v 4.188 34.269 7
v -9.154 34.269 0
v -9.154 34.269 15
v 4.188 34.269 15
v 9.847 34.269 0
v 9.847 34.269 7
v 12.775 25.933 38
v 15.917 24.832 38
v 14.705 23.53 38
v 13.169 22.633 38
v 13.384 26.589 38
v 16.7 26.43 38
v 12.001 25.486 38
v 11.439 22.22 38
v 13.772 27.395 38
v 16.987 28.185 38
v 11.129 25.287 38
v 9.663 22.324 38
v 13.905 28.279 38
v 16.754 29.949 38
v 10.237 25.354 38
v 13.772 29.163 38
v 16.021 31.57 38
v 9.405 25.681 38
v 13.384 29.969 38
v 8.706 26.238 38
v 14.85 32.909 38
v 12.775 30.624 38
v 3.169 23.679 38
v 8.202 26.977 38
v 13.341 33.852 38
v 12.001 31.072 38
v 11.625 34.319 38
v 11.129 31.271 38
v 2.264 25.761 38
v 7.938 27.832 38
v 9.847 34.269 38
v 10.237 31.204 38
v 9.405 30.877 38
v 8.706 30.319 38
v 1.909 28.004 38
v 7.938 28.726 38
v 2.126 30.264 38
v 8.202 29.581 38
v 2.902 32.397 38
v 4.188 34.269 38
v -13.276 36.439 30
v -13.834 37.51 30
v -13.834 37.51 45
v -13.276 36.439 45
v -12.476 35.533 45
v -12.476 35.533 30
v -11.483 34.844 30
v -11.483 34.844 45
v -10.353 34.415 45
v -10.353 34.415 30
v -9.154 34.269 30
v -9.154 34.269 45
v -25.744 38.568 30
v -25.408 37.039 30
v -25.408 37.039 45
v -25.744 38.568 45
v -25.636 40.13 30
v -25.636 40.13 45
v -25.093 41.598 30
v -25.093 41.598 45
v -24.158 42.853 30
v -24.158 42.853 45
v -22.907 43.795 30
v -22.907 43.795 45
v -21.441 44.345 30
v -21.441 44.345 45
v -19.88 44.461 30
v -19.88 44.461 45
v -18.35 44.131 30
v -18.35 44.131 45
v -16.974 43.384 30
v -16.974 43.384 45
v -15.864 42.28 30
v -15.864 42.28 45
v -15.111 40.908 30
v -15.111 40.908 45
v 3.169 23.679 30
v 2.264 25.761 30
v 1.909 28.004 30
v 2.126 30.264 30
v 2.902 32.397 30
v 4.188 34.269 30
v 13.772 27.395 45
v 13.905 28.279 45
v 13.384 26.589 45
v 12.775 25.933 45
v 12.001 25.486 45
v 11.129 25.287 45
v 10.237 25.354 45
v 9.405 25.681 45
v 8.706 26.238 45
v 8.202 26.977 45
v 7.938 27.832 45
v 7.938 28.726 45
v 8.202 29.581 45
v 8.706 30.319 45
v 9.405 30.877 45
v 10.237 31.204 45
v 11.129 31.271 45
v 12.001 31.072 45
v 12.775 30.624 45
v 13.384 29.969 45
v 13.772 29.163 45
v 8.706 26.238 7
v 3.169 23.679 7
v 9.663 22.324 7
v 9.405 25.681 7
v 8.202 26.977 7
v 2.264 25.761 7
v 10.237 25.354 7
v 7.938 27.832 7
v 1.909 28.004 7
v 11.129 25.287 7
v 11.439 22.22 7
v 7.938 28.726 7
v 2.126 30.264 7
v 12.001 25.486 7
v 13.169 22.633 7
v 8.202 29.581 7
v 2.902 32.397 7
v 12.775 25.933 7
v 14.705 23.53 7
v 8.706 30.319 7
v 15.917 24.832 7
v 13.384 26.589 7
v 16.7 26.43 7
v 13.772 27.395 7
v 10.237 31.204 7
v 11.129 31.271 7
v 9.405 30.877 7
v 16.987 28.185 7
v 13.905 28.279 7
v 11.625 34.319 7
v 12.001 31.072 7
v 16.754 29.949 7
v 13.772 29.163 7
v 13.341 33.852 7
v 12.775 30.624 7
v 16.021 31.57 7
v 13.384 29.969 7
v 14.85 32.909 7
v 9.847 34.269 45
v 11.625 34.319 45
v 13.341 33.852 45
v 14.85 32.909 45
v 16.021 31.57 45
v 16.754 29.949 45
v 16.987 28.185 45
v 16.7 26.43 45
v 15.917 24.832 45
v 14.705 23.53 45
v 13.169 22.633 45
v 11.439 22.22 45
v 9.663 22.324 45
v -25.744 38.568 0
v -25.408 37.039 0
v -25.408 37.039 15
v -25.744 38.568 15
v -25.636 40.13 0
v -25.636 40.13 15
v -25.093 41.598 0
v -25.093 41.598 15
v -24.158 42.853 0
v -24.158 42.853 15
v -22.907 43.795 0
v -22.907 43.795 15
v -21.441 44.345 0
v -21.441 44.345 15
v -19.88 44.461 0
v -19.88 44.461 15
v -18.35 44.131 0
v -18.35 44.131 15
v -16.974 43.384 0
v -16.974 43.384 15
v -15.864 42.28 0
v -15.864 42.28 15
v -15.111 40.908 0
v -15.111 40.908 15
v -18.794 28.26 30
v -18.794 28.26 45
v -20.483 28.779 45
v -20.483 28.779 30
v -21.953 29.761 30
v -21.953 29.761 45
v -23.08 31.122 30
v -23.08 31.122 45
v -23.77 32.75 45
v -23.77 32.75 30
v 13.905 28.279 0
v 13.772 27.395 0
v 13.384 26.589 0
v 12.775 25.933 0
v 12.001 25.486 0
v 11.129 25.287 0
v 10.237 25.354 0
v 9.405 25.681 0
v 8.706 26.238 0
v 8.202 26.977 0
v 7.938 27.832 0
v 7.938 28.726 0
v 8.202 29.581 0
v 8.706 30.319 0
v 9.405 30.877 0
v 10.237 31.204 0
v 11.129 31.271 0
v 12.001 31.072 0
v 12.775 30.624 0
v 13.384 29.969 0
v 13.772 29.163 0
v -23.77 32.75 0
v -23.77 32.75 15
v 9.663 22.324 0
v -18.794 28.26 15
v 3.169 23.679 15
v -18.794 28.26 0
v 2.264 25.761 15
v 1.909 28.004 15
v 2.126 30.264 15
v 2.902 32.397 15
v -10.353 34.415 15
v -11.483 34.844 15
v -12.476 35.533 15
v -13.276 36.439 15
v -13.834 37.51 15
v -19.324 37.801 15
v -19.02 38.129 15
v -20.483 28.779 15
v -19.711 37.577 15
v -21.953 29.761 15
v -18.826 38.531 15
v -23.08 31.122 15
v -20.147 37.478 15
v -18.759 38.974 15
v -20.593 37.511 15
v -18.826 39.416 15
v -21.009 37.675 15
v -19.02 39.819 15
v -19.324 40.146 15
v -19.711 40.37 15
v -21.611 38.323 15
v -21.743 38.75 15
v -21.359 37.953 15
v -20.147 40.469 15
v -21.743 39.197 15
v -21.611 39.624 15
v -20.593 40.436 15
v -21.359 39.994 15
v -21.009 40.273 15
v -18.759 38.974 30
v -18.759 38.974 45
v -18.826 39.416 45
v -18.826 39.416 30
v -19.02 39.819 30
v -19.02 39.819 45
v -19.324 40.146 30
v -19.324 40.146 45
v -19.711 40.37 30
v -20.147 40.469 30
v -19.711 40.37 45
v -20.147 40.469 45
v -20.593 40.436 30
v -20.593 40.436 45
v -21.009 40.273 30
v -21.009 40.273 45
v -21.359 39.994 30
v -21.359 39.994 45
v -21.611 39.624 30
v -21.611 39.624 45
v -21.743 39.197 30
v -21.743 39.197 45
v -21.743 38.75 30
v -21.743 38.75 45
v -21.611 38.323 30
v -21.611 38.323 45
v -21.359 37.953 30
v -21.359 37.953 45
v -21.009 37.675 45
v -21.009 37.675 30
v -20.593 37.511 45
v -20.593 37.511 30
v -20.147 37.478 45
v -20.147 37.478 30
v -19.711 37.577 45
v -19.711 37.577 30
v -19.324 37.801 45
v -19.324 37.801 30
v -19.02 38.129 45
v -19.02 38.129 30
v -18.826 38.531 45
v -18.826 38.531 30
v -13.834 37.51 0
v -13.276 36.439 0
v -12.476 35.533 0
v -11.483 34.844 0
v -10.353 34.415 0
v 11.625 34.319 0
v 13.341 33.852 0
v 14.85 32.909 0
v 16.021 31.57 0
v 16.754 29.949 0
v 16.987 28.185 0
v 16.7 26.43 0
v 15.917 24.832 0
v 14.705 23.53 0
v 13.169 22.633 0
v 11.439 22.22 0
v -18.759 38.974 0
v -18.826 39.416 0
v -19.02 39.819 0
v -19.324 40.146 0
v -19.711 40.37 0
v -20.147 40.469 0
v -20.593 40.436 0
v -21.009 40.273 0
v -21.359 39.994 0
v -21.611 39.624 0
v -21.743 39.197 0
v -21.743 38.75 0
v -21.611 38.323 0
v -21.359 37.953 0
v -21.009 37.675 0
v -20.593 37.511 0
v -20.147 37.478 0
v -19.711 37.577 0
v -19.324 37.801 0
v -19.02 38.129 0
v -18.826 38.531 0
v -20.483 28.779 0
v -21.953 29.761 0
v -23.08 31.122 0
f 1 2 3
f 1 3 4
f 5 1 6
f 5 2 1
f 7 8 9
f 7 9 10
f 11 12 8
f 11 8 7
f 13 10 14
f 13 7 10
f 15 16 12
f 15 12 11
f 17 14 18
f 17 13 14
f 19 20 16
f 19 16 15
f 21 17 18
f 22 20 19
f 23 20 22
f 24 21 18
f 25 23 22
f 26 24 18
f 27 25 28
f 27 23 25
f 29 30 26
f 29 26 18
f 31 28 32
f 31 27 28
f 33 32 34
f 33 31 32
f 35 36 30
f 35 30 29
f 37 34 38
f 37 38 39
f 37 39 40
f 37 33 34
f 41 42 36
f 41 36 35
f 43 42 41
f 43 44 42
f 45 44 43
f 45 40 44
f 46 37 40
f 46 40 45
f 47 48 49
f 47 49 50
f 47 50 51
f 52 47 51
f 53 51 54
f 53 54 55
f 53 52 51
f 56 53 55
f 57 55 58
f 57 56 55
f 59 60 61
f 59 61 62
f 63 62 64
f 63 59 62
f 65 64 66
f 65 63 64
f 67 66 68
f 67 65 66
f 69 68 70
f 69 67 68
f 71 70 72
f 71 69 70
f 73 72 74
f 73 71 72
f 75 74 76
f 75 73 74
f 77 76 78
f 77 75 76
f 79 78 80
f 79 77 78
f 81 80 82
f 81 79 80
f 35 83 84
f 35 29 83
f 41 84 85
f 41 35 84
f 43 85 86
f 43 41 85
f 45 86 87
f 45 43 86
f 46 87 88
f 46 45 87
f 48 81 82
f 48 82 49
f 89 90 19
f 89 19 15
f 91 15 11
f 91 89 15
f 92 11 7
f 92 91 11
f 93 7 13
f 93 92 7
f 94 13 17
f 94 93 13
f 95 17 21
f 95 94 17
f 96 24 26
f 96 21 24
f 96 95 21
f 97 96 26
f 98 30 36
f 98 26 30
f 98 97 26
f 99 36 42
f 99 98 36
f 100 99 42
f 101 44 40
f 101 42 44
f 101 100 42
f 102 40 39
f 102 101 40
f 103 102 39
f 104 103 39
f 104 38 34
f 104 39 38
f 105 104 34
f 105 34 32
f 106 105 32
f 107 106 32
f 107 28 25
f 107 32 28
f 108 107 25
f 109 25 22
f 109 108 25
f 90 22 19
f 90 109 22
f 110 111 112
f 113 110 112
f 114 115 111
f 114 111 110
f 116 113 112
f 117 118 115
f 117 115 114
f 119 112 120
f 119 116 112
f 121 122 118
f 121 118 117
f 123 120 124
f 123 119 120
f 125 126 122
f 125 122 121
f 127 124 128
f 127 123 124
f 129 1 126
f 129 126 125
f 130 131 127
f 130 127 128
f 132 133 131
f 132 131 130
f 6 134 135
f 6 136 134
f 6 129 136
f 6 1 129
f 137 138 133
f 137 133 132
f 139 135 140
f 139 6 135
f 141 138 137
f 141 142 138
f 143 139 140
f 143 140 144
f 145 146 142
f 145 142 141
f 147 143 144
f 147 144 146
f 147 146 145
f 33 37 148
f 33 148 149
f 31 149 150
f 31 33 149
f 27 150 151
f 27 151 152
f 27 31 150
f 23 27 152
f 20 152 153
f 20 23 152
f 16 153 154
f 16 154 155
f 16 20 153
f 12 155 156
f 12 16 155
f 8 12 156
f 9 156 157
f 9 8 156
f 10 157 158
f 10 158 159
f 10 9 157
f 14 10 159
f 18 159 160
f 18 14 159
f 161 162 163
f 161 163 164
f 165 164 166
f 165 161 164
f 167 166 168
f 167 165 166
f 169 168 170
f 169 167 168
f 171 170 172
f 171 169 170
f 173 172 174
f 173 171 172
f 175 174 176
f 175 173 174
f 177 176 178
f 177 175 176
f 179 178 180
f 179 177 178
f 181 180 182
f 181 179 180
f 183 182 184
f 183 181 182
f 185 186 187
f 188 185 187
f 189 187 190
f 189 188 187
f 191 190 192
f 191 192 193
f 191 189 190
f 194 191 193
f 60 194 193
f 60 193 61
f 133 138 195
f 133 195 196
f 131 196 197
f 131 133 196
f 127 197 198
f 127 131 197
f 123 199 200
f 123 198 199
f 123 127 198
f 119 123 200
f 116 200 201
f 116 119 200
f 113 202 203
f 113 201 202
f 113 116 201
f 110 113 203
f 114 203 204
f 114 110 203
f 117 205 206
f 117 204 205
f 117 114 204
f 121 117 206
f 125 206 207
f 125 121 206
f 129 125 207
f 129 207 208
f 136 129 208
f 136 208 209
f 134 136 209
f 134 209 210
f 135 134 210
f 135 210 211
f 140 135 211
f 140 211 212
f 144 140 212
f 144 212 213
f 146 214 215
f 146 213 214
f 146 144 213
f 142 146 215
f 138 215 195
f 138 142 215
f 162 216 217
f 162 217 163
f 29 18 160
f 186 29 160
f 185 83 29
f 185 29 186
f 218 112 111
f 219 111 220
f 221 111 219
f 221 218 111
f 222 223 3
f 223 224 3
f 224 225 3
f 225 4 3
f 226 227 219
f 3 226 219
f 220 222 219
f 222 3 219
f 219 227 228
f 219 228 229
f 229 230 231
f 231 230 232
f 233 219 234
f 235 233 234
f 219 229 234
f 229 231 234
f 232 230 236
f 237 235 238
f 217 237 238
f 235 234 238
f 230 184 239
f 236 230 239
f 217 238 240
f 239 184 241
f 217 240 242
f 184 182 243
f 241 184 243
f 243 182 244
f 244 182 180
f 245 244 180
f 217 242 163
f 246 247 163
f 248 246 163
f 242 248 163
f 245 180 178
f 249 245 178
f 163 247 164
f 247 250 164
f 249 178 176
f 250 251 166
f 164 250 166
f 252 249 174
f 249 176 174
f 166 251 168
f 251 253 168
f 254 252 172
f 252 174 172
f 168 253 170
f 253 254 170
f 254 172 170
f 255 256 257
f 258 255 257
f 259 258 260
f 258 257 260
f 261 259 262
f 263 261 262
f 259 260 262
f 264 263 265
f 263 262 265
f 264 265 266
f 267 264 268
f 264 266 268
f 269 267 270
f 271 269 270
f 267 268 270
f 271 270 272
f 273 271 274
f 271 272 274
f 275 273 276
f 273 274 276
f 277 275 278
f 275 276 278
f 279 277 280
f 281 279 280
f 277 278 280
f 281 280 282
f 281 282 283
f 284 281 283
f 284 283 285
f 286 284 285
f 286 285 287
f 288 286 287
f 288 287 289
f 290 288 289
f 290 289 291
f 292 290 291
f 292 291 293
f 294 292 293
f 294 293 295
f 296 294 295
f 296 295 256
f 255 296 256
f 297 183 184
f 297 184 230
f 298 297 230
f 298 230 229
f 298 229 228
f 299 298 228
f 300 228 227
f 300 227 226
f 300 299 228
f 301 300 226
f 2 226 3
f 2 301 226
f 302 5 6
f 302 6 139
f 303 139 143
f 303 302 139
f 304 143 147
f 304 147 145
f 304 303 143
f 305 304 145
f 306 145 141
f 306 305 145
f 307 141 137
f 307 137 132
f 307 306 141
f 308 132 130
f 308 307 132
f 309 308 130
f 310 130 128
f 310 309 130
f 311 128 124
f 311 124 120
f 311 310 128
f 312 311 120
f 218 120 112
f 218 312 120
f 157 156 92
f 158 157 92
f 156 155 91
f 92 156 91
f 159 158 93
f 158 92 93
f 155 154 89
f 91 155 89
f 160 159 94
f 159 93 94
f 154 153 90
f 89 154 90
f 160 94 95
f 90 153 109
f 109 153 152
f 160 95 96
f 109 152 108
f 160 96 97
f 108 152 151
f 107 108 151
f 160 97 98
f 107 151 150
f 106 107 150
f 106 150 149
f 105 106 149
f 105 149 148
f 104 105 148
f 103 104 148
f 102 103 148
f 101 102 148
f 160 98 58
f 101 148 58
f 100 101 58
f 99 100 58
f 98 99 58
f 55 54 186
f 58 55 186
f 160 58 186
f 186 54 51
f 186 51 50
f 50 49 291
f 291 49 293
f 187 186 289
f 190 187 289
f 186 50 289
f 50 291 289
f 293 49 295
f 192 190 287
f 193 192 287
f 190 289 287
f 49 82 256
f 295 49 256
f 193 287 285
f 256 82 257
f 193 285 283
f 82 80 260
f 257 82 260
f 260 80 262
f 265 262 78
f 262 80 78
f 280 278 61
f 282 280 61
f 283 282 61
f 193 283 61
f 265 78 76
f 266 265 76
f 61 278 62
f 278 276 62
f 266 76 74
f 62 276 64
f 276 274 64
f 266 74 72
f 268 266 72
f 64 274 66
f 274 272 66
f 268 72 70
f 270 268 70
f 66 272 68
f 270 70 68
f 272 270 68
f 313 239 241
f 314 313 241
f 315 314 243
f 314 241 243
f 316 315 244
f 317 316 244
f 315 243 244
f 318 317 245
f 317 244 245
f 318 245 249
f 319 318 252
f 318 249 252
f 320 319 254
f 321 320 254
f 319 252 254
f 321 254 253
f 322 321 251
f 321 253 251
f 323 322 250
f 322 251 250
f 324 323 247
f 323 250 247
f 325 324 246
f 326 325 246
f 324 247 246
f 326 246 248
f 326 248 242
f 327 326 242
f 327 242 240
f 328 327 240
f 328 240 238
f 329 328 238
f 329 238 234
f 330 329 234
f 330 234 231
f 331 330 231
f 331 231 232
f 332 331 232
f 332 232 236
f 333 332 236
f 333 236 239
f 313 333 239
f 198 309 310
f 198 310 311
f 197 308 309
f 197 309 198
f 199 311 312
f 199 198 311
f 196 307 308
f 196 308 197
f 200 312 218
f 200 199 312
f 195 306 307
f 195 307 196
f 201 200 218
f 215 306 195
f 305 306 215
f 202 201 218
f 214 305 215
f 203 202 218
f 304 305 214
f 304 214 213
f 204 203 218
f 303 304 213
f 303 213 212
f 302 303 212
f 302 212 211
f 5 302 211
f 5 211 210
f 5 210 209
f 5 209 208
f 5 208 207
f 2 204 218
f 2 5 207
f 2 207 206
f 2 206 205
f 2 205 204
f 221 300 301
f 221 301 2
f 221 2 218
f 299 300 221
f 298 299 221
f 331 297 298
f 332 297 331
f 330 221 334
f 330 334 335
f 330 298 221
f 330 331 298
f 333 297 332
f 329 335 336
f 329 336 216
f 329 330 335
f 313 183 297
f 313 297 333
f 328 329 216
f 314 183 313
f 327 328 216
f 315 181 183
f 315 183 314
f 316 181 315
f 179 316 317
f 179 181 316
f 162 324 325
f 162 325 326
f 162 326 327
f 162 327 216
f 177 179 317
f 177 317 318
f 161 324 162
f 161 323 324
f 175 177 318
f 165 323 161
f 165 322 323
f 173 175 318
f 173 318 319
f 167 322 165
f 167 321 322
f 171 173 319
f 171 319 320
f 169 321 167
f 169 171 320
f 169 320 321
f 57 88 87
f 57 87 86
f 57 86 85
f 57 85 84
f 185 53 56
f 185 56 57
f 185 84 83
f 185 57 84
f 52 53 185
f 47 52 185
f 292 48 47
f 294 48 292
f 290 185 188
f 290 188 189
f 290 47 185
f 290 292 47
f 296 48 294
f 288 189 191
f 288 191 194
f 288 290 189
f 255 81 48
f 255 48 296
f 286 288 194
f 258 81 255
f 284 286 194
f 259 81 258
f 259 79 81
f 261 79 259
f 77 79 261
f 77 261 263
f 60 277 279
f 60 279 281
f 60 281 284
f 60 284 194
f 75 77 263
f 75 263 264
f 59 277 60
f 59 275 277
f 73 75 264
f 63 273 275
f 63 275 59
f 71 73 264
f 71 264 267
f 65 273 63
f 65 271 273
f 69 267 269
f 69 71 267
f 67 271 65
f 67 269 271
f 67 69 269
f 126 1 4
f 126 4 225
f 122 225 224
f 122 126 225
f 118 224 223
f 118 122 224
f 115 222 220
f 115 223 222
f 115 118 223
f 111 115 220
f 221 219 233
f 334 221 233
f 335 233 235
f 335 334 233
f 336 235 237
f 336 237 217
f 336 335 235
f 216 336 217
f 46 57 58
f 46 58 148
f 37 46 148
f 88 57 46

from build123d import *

# Parameters (mm, degrees)
BOSS_EXTRUDE2_DEPTH     = 15
SKETCH7_R               = 1.5
CUT_EXTRUDE1_DEPTH      = 18
CUT_EXTRUDE3_DEPTH      = 69
CUT_EXTRUDE3_DEPTH_BACK = 8
SKETCH12_R              = 9
CUT_EXTRUDE4_START      = -8
SKETCH13_R              = 9
CUT_EXTRUDE4_DEPTH      = 8
CUT_EXTRUDE5_DEPTH      = 10
CUT_EXTRUDE5_DEPTH_BACK = 48
SKETCH14_R              = 3


with BuildPart() as part:
    # Sketch3 → Boss-Extrude2 (new body)
    with BuildSketch(Plane.XY):
        with BuildLine():
            Line((-15.110783356, 40.907999924), (-13.834269034, 37.510363732))
            ThreePointArc((-13.834269034, 37.510363732), (-12.000412792, 35.158370297), (-9.15371136, 34.268880114))
            Line((-9.15371136, 34.268880114), (9.846529055, 34.268880114))
            ThreePointArc((9.846529055, 34.268880114), (16.986915334, 28.185418753), (9.662855904, 22.324380295))
            Line((9.662855904, 22.324380295), (-18.79366315, 28.260093131))
            ThreePointArc((-18.79366315, 28.260093131), (-21.953247193, 29.760673649), (-23.769791608, 32.749800546))
            Line((-23.769791608, 32.749800546), (-25.408010237, 37.039263884))
            ThreePointArc((-25.408010237, 37.039263884), (-22.193764817, 44.122245345), (-15.110783356, 40.907999924))
        make_face()
    extrude(amount=BOSS_EXTRUDE2_DEPTH)

    # Sketch7 → Cut-Extrude1 (cut)
    with BuildSketch(Plane.XY.offset(15)):
        with Locations((-20.259396796, 38.973631904)):
            Circle(SKETCH7_R)
    extrude(amount=-CUT_EXTRUDE1_DEPTH, mode=Mode.SUBTRACT)


with BuildPart() as body_2:
    # Body-Move/Copy1: copy of part
    add(part.part.moved(Location((0, 0, 30))))

    # Sketch13 → Cut-Extrude4 (cut)
    with BuildSketch(Plane(origin=(0, 0, 30), x_dir=(-1, 0, 0), z_dir=(0, 0, -1)).offset(CUT_EXTRUDE4_START)):
        with Locations((-10.904911352, 28.278943041)):
            Circle(SKETCH13_R)
    extrude(amount=CUT_EXTRUDE4_DEPTH, mode=Mode.SUBTRACT)


with BuildPart() as part_1:
    add(part.part)

    # Sketch12 → Cut-Extrude3 (cut, two sides: drawn at the far end of the back side and taken through both)
    with BuildSketch(Plane.XY.offset(15).offset(-CUT_EXTRUDE3_DEPTH_BACK)):
        with Locations((10.904911352, 28.278943041)):
            Circle(SKETCH12_R)
    extrude(amount=CUT_EXTRUDE3_DEPTH + CUT_EXTRUDE3_DEPTH_BACK, mode=Mode.SUBTRACT)


with BuildPart() as cut_extrude5_tool:
    # Sketch14 → Cut-Extrude5 (new, two sides: drawn at the far end of the back side and taken through both)
    with BuildSketch(Plane(origin=(0, 0, 0), x_dir=(-1, 0, 0), z_dir=(0, 0, -1)).offset(-CUT_EXTRUDE5_DEPTH_BACK)):
        with Locations(Location((-10.904911352, 28.278943041, 0), (0, 0, 180))):
            Circle(SKETCH14_R)
    extrude(amount=CUT_EXTRUDE5_DEPTH + CUT_EXTRUDE5_DEPTH_BACK)


with BuildPart() as part_2:
    add(part_1.part)

    # Cut-Extrude5: cut by cut_extrude5_tool
    add(cut_extrude5_tool.part, mode=Mode.SUBTRACT)


with BuildPart() as body_2_1:
    add(body_2.part)

    # Cut-Extrude5: cut by cut_extrude5_tool
    add(cut_extrude5_tool.part, mode=Mode.SUBTRACT)


solid = Compound([part_2.part, body_2_1.part])
